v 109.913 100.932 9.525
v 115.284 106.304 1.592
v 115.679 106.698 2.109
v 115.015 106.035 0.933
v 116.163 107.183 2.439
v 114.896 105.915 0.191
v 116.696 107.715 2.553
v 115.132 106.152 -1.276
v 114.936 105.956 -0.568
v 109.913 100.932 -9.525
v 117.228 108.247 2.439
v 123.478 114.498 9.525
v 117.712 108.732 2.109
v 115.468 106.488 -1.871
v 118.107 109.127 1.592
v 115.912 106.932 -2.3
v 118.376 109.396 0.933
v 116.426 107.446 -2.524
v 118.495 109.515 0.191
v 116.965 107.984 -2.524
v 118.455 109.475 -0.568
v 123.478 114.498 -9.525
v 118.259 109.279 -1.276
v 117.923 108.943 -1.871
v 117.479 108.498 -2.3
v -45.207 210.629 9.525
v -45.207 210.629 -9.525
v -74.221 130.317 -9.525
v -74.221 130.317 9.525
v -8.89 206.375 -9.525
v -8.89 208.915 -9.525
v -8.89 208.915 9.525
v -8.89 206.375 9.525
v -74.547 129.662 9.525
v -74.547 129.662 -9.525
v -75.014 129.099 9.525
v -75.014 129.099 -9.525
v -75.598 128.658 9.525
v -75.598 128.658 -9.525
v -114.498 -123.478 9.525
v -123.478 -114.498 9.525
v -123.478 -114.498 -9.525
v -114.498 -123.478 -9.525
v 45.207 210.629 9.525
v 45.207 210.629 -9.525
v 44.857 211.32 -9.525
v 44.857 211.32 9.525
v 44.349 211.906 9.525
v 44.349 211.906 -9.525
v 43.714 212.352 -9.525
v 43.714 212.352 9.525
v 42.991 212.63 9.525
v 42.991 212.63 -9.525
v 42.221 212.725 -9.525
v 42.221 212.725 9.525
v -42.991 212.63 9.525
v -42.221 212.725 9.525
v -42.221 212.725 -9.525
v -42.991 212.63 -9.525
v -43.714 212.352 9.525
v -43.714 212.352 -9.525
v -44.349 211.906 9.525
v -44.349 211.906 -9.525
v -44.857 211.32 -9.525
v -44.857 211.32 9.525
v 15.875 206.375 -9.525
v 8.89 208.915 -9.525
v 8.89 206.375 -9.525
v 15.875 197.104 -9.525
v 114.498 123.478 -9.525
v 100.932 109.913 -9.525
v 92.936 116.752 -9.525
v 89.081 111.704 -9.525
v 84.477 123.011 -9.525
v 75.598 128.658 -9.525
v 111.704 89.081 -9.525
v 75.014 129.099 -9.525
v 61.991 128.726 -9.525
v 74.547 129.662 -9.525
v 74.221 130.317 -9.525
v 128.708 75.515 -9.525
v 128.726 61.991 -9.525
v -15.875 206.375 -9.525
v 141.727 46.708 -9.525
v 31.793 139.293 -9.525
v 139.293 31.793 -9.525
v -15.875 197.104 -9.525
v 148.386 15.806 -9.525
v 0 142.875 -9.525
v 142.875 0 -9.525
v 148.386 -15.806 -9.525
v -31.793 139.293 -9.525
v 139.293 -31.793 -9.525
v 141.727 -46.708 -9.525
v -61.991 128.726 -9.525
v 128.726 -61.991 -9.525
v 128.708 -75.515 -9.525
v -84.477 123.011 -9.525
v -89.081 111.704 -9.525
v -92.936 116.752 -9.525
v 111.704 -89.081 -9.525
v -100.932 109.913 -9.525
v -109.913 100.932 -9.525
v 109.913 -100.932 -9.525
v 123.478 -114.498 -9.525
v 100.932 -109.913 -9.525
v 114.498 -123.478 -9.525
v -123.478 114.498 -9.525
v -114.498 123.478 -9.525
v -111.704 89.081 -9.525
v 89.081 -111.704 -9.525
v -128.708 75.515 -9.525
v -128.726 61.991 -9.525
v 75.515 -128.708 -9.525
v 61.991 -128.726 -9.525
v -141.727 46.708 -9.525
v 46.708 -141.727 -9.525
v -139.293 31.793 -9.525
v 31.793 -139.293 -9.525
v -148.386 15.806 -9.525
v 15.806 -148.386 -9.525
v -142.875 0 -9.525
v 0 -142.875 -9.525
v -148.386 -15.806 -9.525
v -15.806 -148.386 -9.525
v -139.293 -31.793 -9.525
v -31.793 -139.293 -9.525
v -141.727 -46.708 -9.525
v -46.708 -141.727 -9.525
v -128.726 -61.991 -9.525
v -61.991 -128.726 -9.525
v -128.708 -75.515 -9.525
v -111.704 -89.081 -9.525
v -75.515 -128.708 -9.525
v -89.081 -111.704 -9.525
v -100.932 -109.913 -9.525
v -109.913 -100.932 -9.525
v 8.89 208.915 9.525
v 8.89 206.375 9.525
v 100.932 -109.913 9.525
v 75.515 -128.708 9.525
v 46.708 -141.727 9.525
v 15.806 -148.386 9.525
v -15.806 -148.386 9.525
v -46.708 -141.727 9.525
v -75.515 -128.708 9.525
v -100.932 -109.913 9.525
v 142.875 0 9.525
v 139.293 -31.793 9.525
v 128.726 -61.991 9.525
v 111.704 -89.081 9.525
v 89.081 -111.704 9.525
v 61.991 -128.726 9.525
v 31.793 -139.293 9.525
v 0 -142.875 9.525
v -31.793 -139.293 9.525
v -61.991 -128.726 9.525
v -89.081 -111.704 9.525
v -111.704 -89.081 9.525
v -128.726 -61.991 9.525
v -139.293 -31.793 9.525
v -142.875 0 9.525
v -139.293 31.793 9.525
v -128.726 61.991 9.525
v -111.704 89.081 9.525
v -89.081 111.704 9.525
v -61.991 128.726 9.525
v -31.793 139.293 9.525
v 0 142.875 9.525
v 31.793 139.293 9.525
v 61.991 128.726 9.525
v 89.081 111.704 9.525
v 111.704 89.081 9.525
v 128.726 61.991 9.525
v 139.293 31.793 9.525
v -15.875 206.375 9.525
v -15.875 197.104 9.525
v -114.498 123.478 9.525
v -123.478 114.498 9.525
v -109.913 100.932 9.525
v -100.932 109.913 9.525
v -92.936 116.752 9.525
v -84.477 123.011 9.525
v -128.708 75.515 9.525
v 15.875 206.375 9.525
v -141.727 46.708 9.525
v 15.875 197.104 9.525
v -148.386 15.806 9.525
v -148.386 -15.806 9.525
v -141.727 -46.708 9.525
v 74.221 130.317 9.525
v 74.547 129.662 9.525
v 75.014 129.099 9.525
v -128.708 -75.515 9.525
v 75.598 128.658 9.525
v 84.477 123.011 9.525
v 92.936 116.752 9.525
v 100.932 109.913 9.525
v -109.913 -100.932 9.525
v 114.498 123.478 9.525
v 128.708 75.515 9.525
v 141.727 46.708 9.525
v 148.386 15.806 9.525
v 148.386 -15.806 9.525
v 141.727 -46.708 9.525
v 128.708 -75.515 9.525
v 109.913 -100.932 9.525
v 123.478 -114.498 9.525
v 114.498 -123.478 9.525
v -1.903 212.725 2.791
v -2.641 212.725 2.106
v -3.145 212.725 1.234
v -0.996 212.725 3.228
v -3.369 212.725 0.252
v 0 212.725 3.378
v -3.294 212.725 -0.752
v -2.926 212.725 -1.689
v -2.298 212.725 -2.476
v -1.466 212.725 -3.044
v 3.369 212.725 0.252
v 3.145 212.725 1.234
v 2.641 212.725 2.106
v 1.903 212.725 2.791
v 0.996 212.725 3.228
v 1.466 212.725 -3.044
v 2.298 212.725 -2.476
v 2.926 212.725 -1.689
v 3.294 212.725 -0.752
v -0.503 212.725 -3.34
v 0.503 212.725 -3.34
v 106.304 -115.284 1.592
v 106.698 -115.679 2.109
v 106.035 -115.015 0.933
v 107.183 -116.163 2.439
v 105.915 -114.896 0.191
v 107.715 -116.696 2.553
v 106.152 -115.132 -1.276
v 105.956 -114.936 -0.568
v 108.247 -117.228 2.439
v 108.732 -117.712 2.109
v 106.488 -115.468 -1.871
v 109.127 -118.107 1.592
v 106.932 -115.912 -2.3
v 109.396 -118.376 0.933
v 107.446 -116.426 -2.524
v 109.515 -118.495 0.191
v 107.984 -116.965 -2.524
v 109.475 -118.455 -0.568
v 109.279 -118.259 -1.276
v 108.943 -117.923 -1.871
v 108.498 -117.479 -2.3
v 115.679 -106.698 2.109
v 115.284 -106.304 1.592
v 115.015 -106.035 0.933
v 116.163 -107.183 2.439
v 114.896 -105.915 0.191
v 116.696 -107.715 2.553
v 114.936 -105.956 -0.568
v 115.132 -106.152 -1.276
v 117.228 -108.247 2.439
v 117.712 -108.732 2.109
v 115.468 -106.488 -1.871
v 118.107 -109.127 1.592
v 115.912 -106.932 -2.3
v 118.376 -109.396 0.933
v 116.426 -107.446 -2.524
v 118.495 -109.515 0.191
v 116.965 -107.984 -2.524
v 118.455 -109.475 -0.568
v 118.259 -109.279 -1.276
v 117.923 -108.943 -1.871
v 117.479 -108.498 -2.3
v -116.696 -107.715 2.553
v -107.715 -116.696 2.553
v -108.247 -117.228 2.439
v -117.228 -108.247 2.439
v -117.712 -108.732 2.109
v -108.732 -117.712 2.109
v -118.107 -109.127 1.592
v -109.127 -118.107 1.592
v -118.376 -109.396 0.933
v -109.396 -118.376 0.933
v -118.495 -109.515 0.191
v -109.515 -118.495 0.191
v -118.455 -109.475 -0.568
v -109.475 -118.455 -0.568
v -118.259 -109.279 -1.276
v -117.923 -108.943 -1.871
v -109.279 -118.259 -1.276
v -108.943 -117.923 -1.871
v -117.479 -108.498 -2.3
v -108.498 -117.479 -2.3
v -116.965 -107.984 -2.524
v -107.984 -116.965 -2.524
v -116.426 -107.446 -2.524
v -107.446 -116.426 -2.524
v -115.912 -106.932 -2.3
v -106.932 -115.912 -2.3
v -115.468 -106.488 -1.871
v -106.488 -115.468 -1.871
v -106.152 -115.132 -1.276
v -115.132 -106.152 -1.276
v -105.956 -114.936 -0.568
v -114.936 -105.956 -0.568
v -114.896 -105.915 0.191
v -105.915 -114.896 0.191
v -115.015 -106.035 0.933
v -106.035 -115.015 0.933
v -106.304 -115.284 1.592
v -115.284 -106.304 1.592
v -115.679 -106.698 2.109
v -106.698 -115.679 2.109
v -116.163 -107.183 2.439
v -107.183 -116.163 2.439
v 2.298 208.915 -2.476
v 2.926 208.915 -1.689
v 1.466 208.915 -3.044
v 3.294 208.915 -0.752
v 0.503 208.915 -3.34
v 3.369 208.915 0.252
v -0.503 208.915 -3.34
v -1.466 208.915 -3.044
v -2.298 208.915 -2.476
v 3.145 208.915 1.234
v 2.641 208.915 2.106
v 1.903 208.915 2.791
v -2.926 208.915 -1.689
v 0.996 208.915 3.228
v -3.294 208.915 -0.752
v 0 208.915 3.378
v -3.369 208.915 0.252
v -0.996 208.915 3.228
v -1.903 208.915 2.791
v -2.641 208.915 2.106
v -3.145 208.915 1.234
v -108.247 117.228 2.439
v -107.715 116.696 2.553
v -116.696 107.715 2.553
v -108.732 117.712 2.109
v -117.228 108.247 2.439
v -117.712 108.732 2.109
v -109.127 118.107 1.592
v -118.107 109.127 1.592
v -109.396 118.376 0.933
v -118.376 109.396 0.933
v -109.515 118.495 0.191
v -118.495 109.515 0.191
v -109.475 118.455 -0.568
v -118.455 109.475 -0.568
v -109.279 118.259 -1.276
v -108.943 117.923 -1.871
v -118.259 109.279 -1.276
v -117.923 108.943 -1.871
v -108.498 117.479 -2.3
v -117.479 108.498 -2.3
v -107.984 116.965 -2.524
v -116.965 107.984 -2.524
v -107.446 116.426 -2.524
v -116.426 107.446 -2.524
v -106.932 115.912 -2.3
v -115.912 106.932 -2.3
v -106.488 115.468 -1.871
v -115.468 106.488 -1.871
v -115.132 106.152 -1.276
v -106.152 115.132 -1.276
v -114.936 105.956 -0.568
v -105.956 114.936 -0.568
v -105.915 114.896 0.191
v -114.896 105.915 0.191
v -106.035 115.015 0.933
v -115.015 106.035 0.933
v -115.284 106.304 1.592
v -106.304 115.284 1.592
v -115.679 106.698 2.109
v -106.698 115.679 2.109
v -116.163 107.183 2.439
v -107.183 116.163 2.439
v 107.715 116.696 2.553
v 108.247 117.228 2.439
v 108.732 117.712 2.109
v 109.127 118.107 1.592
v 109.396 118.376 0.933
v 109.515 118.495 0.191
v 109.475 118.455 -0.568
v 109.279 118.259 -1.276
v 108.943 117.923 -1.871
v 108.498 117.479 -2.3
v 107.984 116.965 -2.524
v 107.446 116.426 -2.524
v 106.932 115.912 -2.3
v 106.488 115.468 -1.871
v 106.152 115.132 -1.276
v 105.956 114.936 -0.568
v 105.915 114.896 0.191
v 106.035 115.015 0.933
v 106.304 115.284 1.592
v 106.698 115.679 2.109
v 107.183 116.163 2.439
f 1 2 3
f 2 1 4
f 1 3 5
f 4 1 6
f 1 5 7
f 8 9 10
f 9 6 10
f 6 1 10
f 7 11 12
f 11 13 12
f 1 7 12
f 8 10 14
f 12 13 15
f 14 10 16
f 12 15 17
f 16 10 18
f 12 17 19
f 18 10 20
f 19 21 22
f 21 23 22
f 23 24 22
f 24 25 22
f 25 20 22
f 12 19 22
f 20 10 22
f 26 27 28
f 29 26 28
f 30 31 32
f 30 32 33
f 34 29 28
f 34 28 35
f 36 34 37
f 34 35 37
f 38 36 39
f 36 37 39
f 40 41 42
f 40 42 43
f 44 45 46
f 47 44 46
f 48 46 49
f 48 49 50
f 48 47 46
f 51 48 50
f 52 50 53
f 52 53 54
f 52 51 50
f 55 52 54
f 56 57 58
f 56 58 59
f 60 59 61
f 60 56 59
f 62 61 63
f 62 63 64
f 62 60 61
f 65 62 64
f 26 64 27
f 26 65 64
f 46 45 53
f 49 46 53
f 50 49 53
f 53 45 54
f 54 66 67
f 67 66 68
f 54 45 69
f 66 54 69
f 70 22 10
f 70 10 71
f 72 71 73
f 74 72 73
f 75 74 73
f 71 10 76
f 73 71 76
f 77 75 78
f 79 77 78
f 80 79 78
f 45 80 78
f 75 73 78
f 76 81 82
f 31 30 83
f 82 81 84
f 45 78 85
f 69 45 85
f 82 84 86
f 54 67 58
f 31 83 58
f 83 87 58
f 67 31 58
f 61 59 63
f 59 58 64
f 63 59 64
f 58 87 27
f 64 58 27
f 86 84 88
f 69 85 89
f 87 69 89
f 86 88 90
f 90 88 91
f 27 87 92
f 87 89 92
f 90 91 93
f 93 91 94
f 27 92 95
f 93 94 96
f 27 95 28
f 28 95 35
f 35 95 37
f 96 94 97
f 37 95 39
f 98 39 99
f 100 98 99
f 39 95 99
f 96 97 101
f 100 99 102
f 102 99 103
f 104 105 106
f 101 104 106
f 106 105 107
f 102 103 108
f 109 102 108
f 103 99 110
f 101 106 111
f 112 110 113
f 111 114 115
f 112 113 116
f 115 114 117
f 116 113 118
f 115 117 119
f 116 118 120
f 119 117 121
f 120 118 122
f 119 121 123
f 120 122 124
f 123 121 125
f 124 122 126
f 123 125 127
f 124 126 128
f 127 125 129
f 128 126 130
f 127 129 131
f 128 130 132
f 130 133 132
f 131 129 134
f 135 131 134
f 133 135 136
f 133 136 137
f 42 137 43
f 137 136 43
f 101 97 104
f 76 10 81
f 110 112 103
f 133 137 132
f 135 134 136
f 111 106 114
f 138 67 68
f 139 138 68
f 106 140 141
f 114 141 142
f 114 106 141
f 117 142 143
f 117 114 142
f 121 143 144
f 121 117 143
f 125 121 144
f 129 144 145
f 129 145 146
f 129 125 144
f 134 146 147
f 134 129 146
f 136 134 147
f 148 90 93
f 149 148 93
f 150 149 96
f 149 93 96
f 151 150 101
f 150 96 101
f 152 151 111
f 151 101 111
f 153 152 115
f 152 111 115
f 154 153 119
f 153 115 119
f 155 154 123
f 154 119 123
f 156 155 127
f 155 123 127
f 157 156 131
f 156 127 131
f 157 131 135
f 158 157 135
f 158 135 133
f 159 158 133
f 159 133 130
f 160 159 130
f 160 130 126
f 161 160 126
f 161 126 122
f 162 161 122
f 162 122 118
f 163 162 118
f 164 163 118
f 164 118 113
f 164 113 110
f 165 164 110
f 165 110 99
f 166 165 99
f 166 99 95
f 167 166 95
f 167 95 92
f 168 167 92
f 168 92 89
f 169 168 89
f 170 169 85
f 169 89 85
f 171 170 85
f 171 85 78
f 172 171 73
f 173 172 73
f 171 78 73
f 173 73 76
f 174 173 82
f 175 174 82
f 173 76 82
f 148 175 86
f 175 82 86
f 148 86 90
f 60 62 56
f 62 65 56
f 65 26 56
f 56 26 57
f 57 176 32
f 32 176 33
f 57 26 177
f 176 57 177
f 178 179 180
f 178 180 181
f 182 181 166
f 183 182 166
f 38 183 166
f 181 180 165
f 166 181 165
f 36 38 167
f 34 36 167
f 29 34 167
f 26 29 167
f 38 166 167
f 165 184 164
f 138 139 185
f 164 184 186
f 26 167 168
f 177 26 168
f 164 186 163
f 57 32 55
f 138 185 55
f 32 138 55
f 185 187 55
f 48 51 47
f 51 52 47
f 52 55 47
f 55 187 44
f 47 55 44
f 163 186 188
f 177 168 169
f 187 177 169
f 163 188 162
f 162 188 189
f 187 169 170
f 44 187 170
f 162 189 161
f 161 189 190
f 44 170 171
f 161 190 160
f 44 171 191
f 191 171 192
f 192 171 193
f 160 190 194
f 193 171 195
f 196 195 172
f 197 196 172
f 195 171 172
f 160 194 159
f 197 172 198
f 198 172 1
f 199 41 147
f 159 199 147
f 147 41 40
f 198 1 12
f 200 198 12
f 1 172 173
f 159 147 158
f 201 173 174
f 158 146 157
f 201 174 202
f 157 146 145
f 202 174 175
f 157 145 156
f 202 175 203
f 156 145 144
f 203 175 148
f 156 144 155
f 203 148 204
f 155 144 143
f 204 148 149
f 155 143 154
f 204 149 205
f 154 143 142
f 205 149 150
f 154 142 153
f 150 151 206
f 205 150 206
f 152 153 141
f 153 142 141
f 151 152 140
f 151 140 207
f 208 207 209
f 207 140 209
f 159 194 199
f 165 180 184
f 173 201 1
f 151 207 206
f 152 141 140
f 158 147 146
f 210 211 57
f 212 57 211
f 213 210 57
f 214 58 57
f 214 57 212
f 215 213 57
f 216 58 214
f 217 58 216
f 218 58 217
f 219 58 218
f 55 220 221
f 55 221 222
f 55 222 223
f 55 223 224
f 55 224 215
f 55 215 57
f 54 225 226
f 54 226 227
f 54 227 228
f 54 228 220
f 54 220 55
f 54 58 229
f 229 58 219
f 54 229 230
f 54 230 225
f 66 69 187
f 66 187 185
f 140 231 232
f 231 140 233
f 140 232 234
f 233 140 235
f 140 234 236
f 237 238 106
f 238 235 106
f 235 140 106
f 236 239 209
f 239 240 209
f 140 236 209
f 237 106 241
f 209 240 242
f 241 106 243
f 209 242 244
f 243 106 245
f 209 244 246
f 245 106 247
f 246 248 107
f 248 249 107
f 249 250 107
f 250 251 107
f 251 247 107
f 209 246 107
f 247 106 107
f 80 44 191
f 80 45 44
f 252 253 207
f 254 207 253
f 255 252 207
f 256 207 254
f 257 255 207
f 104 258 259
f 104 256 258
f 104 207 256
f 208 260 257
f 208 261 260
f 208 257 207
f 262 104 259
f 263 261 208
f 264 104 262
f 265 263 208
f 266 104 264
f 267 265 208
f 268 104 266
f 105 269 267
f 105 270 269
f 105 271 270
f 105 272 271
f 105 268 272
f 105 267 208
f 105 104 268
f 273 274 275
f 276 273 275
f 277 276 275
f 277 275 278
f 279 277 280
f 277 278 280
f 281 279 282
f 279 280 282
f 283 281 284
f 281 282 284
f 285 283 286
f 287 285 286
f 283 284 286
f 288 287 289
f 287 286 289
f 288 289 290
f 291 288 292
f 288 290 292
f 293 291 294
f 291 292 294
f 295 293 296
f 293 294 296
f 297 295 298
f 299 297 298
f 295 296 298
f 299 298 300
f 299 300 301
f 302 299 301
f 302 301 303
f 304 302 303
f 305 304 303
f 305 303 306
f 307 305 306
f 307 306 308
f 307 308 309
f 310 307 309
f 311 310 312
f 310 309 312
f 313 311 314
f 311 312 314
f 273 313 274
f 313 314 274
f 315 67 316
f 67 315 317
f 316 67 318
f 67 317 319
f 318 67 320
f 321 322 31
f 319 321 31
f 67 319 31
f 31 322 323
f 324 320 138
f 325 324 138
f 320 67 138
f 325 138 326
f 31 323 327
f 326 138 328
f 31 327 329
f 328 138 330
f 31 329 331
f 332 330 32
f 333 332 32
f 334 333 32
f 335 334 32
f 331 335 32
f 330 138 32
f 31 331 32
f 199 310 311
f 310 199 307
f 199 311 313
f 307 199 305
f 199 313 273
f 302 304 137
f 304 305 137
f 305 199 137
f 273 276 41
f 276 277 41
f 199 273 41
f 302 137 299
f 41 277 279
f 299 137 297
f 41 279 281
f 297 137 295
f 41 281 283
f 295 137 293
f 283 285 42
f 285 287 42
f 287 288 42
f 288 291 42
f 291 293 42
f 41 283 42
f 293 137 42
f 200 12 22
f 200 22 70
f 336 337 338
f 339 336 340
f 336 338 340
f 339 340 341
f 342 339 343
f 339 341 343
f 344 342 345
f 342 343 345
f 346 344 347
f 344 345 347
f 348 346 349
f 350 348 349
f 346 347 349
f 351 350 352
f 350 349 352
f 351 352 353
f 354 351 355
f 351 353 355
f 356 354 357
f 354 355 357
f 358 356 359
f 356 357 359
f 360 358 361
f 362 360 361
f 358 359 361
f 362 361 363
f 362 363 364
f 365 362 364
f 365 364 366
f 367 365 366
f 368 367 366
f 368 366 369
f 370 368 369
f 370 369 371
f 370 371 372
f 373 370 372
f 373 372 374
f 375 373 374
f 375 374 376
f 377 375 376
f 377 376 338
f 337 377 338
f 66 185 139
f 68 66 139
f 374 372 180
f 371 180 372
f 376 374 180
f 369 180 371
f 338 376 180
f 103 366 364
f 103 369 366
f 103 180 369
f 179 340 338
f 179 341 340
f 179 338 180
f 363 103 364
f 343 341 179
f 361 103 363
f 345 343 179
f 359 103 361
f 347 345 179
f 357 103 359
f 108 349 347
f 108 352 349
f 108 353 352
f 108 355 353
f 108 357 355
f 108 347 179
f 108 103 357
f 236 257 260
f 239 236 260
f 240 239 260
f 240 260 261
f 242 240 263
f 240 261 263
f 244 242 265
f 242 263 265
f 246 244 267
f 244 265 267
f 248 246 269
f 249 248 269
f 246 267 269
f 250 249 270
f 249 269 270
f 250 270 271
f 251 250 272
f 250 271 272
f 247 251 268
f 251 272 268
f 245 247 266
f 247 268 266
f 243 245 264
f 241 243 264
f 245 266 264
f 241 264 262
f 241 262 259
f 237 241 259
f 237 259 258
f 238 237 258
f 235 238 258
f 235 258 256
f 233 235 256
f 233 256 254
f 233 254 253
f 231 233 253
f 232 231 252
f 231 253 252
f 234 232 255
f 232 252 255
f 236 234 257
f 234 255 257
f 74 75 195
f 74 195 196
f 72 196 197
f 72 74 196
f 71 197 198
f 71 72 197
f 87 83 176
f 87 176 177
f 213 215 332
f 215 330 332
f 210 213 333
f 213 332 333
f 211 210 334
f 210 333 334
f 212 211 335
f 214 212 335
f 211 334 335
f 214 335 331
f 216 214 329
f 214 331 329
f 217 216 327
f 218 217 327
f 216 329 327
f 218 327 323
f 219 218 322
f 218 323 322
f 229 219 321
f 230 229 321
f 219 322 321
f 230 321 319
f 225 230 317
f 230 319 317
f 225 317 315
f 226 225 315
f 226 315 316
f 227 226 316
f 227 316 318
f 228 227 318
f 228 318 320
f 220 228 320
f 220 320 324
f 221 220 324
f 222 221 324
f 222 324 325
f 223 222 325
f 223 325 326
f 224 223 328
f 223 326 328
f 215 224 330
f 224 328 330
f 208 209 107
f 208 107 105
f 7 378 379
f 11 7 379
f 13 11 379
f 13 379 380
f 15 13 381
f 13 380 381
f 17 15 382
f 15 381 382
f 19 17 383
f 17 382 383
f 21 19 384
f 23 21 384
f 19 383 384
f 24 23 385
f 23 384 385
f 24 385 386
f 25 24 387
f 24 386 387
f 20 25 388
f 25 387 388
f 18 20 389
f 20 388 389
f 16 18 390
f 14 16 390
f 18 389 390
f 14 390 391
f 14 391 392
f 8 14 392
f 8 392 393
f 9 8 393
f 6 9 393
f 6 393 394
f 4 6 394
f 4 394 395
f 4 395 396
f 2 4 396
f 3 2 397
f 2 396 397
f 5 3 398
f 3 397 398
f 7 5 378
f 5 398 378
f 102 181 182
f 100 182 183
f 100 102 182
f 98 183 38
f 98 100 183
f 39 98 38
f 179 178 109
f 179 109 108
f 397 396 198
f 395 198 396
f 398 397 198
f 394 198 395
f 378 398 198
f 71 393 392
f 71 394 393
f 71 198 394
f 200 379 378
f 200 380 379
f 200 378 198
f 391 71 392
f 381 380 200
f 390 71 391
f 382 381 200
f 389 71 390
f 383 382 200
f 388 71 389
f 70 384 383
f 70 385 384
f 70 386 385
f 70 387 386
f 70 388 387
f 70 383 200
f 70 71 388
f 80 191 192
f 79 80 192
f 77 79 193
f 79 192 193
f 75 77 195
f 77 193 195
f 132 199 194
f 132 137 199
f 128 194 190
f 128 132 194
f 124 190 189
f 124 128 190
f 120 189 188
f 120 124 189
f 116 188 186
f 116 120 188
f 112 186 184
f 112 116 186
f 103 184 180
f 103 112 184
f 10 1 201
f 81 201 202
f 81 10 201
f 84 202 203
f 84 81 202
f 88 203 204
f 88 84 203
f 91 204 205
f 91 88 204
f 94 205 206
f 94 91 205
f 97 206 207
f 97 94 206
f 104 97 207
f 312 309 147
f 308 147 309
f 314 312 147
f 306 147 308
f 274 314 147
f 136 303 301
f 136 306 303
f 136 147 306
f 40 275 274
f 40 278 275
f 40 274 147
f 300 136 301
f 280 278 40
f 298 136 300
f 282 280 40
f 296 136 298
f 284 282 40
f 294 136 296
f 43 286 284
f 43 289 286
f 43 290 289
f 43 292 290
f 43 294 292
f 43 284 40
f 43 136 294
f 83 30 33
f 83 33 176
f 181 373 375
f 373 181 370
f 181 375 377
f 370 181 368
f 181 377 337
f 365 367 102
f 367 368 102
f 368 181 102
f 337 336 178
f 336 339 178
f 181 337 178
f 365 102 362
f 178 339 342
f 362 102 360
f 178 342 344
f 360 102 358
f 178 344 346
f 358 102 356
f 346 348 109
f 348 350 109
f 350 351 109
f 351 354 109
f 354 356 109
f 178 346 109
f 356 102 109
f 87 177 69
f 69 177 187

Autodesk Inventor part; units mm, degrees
ref_plane "YZ Plane" through (0, 0, 0) normal (1, 0, 0) x (0, 1, 0)
ref_plane "XY Plane" through (0, 0, 0) normal (0, 0, 1) x (1, 0, 0)
sketch "Sketch1" plane through (0, 0, 0) normal (0, 0, 1) x (1, 0, 0)
  circle A0 centre (0, 0) radius 142.875
  circle A1 centre (0, 0) radius 149.225
  dimension "innerDiameter" = 285.75
  dimension "outerDiameter" = 298.45
extrude "Extrusion1" add sketch "Sketch1" along normal mid plane 19.05
sketch "Sketch2" plane through (0, 0, 0) normal (0, 0, 1) x (1, 0, 0)
  circle A0 centre (0, 0) radius 142.875 construction
  line L0 (0, 142.875) -> (0, 149.225) construction
  circle A1 centre (0, 0) radius 149.225 construction
  line L1 (0, 142.875) -> (44.45, 142.875)
  line L2 (44.45, 142.875) -> (44.45, 149.225)
  line L3 (44.45, 149.225) -> (19.05, 149.225)
  line L4 (0, 142.875) -> (-44.45, 142.875)
  line L5 (-44.45, 142.875) -> (-44.45, 149.225)
  line L6 (-44.45, 149.225) -> (19.05, 149.225)
  line L7 (371.6693, 35.081) -> (0, 0)
  dimension "halfBaseWidth" = 44.45
  dimension "baseThickness" = 6.35
  dimension "baseHeight" = 0
extrude "Extrusion2" add sketch "Sketch2" along normal mid plane 19.05
sketch "Sketch5" plane through (-44.45, 149.225, 9.525) normal (0, 1, 0) x (1, 0, 0)
  line L0 (0, 19.05) -> (0, 0) projected
  line L1 (88.9, 19.05) -> (88.9, 0) projected
  line L2 (0, 0) -> (88.9, 0)
  line L3 (88.9, 0) -> (88.9, 19.05)
  line L4 (88.9, 19.05) -> (0, 19.05)
  line L5 (0, 19.05) -> (0, 0)
  point P0 (44.45, 9.525)
  point P1 (0, 19.05)
extrude "Extrusion3" add sketch "Sketch5" along normal blind 63.5
sketch "Sketch7" plane through (0, 0, 9.525) normal (0, 0, 1) x (1, 0, 0)
  line L0 (-44.45, 142.875) -> (-44.45, 212.725) projected
  line L1 (-44.45, 212.725) -> (44.45, 212.725) projected
  line L2 (44.45, 142.875) -> (44.45, 212.725) projected
  line L3 (0, 212.725) -> (0, 149.1868) construction
  line L4 (-15.875, 197.104) -> (15.875, 197.104)
  line L5 (15.875, 197.104) -> (15.875, 206.375)
  line L6 (15.875, 206.375) -> (-15.875, 206.375)
  line L7 (-15.875, 206.375) -> (-15.875, 197.104)
  line L8 (-15.875, 197.104) -> (15.875, 206.375) construction
  line L9 (15.875, 197.104) -> (-15.875, 206.375) construction
  point P0 (0, 0)
  point P1 (-38.1, 144.2792)
  point P2 (38.1, 144.2792)
  point P3 (0, 201.7395)
  dimension "screwHoleWidth" = 31.75
  dimension "screwHoleHeight" = 9.271
  dimension "screwHoleSupportThickness" = 6.35
extrude "Extrusion4" cut sketch "Sketch7" against normal through all
sketch "Sketch6" plane through (-44.45, 212.725, 9.525) normal (0, 1, 0) x (1, 0, 0)
  point P0 (44.45, 9.525)
  point P1 (44.45, 9.525)
hole "Hole2" at (0, 212.725, 0) direction (0, -1, 0) diameter 6.7564 depth 6.35 clearance for "Flat Head Machine Screw (82)" size "1/4" standard "Ansi Unified Screw Threads"
ref_plane "Work Plane1" through (0, 0, 0) normal (-0.7071, 0.7071, 0) x (0, 0, 1)
ref_plane "Work Plane2" through (0, 0, 0) normal (0.7071, 0.7071, 0) x (0, 0, 1)
sketch "Sketch11" plane through (0, 0, 0) normal (0, 0, 1) x (1, 0, 0)
  arc A0 (-43.0678, 142.875) -> (43.0678, 142.875) centre (0, 0) ccw projected
  circle A1 centre (0, 0) radius 142.875 projected
  line L0 (-214.9625, 214.9625) -> (217.3313, -217.3313) projected
  line L1 (-101.0279, 101.0279) -> (-96.5378, 105.518)
  line L2 (-101.0279, 101.0279) -> (-94.6779, 101.0279) construction
  line L3 (-96.5378, 105.518) -> (-114.4983, 123.4785)
  line L4 (-96.5378, 105.518) -> (-71.1378, 105.518) construction
  line L5 (-114.4983, 123.4785) -> (-118.9884, 118.9884)
  line L6 (-118.9884, 118.9884) -> (-101.0279, 101.0279)
  line L7 (-101.0279, 101.0279) -> (-105.518, 96.5378)
  line L8 (-105.518, 96.5378) -> (-123.4785, 114.4983)
  line L9 (-123.4785, 114.4983) -> (-118.9884, 118.9884)
  point P0 (38.1, 144.2792)
  point P1 (-38.1, 144.2792)
  point P2 (-109.9126, 100.9323)
  point P3 (-100.9323, 109.9126)
  dimension "d47" = 6.35
  dimension "d48" = 45
  dimension "d49" = 25.4
  dimension "d50" = 135
extrude "Extrusion7" add sketch "Sketch11" along normal mid plane 19.05 contours A0 L0 L5 L3 | A0 L8 L9 L0
sketch "Sketch12" plane through (-114.4983, 123.4785, -9.525) normal (0.7071, 0.7071, 0) x (-0.7071, 0.7071, 0)
  line L0 (0, 0) -> (0, 19.05) projected
  line L1 (-19.1852, 19.05) -> (0, 19.05) projected
  line L2 (-19.1852, 0) -> (-19.1852, 19.05) projected
  line L3 (0, 0) -> (-19.1852, 0) projected
  line L4 (-9.5926, 19.05) -> (-9.5926, 0) construction
  line L5 (0, 9.525) -> (-19.1852, 9.525) construction
  point P0 (-168.275, 9.525)
  point P1 (-9.5926, 9.525)
hole "Hole4" at (-107.7153, 116.6955, 0) direction (-0.7071, -0.7071, 0) diameter 5.1054 depth 12.7 clearance for "Flat Head Machine Screw (82)" size "#10" standard "Ansi Unified Screw Threads"
pattern_circular "Circular Pattern1" count 4 over 360 about axis through (0, 0, -10) along (0, 0, 1) of "Extrusion7", "Hole4"
sketch "Sketch13" plane through (0, 0, 9.525) normal (0, 0, 1) x (1, 0, 0)
  line L0 (-15.875, 206.375) -> (15.875, 206.375) projected
  line L1 (-44.45, 212.725) -> (44.45, 212.725) projected
  line L2 (0, 208.915) -> (8.89, 208.915)
  line L3 (8.89, 208.915) -> (8.89, 206.375)
  line L4 (8.89, 206.375) -> (0, 206.375)
  line L5 (0, 208.915) -> (0, 206.375)
  line L6 (15.875, 206.375) -> (-15.875, 206.375)
  line L7 (0, 208.915) -> (-8.89, 208.915)
  line L8 (-8.89, 208.915) -> (-8.89, 206.375)
  point P0 (0, 0)
  dimension "d63" = 8.89
  dimension "d64" = 2.54
extrude "Extrusion8" cut sketch "Sketch13" against normal through all
sketch "Sketch14" plane through (0, 0, 9.525) normal (0, 0, 1) x (1, 0, 0)
  point P0 (0, 0)
sketch "Sketch15" plane through (0, 0, 0) normal (0, 0, 1) x (1, 0, 0)
  arc A0 (-43.0678, 142.875) -> (-100.9323, 109.9126) centre (0, 0) ccw projected
  line L0 (-43.0678, 142.875) -> (-44.45, 142.875) projected
  line L1 (44.45, 142.875) -> (43.0678, 142.875) projected
  arc A1 (100.9323, 109.9126) -> (43.0678, 142.875) centre (0, 0) ccw projected
  line L2 (-44.45, 142.875) -> (-44.45, 142.451)
  line L3 (-44.45, 142.875) -> (-43.0678, 142.875)
  line L4 (43.0678, 142.875) -> (44.45, 142.875)
  line L5 (44.45, 142.875) -> (44.45, 142.451)
  arc A2 (-43.0678, 142.875) -> (-44.45, 142.451) centre (0, 0) ccw
  arc A3 (44.45, 142.451) -> (43.0678, 142.875) centre (0, 0) ccw
extrude "Extrusion9" add sketch "Sketch15" along normal mid plane 19.05
sketch "Sketch16" plane through (0, 0, 0) normal (0, 0, 1) x (1, 0, 0)
  line L0 (44.45, 142.451) -> (44.45, 212.725) projected
  line L1 (-44.45, 142.451) -> (-44.45, 212.725) projected
  arc A0 (-44.45, 142.451) -> (-100.9323, 109.9126) centre (0, 0) ccw projected
  arc A1 (100.9323, 109.9126) -> (44.45, 142.451) centre (0, 0) ccw projected
  line L2 (0, 0) -> (-74.6125, 129.2326) construction
  line L3 (0, 0) -> (0, 149.225) construction
  line L4 (0, 0) -> (74.6125, 129.2326) construction
  line L5 (-44.45, 212.725) -> (-74.6125, 129.2326)
  line L6 (-44.45, 142.451) -> (-44.45, 212.725) projected
  line L7 (-44.45, 142.451) -> (-44.45, 212.725)
  line L8 (44.45, 212.725) -> (44.45, 142.451)
  line L9 (44.45, 212.725) -> (74.6125, 129.2326)
  arc A2 (74.6125, 129.2326) -> (44.45, 142.451) centre (0, 0) ccw
  arc A3 (-44.45, 142.451) -> (-74.6125, 129.2326) centre (0, 0) ccw
  dimension "d69" = 30
  dimension "d70" = 30
extrude "Extrusion10" add sketch "Sketch16" along normal mid plane 19.05
fillet "Fillet1" radius 3.175 2 edges at (-74.6125, 129.2326, 0) (74.6125, 129.2326, 0)
fillet "Fillet2" radius 3.175 2 edges at (-44.45, 212.725, 0) (44.45, 212.725, 0)
equation "\"outerDiameter\" = innerDiameter + 2 * ringThicknessRadius"
equation "\"d7\" = ringWidth"
equation "\"d51\" = ringWidth"
equation "\"d67\" = ringWidth"
equation "\"d71\" = ringWidth"
equation "\"ringThicknessRadius\" = 6.35"
equation "\"ringWidth\" = 19.05"
properties part number "mount" material "PET Plastic"
